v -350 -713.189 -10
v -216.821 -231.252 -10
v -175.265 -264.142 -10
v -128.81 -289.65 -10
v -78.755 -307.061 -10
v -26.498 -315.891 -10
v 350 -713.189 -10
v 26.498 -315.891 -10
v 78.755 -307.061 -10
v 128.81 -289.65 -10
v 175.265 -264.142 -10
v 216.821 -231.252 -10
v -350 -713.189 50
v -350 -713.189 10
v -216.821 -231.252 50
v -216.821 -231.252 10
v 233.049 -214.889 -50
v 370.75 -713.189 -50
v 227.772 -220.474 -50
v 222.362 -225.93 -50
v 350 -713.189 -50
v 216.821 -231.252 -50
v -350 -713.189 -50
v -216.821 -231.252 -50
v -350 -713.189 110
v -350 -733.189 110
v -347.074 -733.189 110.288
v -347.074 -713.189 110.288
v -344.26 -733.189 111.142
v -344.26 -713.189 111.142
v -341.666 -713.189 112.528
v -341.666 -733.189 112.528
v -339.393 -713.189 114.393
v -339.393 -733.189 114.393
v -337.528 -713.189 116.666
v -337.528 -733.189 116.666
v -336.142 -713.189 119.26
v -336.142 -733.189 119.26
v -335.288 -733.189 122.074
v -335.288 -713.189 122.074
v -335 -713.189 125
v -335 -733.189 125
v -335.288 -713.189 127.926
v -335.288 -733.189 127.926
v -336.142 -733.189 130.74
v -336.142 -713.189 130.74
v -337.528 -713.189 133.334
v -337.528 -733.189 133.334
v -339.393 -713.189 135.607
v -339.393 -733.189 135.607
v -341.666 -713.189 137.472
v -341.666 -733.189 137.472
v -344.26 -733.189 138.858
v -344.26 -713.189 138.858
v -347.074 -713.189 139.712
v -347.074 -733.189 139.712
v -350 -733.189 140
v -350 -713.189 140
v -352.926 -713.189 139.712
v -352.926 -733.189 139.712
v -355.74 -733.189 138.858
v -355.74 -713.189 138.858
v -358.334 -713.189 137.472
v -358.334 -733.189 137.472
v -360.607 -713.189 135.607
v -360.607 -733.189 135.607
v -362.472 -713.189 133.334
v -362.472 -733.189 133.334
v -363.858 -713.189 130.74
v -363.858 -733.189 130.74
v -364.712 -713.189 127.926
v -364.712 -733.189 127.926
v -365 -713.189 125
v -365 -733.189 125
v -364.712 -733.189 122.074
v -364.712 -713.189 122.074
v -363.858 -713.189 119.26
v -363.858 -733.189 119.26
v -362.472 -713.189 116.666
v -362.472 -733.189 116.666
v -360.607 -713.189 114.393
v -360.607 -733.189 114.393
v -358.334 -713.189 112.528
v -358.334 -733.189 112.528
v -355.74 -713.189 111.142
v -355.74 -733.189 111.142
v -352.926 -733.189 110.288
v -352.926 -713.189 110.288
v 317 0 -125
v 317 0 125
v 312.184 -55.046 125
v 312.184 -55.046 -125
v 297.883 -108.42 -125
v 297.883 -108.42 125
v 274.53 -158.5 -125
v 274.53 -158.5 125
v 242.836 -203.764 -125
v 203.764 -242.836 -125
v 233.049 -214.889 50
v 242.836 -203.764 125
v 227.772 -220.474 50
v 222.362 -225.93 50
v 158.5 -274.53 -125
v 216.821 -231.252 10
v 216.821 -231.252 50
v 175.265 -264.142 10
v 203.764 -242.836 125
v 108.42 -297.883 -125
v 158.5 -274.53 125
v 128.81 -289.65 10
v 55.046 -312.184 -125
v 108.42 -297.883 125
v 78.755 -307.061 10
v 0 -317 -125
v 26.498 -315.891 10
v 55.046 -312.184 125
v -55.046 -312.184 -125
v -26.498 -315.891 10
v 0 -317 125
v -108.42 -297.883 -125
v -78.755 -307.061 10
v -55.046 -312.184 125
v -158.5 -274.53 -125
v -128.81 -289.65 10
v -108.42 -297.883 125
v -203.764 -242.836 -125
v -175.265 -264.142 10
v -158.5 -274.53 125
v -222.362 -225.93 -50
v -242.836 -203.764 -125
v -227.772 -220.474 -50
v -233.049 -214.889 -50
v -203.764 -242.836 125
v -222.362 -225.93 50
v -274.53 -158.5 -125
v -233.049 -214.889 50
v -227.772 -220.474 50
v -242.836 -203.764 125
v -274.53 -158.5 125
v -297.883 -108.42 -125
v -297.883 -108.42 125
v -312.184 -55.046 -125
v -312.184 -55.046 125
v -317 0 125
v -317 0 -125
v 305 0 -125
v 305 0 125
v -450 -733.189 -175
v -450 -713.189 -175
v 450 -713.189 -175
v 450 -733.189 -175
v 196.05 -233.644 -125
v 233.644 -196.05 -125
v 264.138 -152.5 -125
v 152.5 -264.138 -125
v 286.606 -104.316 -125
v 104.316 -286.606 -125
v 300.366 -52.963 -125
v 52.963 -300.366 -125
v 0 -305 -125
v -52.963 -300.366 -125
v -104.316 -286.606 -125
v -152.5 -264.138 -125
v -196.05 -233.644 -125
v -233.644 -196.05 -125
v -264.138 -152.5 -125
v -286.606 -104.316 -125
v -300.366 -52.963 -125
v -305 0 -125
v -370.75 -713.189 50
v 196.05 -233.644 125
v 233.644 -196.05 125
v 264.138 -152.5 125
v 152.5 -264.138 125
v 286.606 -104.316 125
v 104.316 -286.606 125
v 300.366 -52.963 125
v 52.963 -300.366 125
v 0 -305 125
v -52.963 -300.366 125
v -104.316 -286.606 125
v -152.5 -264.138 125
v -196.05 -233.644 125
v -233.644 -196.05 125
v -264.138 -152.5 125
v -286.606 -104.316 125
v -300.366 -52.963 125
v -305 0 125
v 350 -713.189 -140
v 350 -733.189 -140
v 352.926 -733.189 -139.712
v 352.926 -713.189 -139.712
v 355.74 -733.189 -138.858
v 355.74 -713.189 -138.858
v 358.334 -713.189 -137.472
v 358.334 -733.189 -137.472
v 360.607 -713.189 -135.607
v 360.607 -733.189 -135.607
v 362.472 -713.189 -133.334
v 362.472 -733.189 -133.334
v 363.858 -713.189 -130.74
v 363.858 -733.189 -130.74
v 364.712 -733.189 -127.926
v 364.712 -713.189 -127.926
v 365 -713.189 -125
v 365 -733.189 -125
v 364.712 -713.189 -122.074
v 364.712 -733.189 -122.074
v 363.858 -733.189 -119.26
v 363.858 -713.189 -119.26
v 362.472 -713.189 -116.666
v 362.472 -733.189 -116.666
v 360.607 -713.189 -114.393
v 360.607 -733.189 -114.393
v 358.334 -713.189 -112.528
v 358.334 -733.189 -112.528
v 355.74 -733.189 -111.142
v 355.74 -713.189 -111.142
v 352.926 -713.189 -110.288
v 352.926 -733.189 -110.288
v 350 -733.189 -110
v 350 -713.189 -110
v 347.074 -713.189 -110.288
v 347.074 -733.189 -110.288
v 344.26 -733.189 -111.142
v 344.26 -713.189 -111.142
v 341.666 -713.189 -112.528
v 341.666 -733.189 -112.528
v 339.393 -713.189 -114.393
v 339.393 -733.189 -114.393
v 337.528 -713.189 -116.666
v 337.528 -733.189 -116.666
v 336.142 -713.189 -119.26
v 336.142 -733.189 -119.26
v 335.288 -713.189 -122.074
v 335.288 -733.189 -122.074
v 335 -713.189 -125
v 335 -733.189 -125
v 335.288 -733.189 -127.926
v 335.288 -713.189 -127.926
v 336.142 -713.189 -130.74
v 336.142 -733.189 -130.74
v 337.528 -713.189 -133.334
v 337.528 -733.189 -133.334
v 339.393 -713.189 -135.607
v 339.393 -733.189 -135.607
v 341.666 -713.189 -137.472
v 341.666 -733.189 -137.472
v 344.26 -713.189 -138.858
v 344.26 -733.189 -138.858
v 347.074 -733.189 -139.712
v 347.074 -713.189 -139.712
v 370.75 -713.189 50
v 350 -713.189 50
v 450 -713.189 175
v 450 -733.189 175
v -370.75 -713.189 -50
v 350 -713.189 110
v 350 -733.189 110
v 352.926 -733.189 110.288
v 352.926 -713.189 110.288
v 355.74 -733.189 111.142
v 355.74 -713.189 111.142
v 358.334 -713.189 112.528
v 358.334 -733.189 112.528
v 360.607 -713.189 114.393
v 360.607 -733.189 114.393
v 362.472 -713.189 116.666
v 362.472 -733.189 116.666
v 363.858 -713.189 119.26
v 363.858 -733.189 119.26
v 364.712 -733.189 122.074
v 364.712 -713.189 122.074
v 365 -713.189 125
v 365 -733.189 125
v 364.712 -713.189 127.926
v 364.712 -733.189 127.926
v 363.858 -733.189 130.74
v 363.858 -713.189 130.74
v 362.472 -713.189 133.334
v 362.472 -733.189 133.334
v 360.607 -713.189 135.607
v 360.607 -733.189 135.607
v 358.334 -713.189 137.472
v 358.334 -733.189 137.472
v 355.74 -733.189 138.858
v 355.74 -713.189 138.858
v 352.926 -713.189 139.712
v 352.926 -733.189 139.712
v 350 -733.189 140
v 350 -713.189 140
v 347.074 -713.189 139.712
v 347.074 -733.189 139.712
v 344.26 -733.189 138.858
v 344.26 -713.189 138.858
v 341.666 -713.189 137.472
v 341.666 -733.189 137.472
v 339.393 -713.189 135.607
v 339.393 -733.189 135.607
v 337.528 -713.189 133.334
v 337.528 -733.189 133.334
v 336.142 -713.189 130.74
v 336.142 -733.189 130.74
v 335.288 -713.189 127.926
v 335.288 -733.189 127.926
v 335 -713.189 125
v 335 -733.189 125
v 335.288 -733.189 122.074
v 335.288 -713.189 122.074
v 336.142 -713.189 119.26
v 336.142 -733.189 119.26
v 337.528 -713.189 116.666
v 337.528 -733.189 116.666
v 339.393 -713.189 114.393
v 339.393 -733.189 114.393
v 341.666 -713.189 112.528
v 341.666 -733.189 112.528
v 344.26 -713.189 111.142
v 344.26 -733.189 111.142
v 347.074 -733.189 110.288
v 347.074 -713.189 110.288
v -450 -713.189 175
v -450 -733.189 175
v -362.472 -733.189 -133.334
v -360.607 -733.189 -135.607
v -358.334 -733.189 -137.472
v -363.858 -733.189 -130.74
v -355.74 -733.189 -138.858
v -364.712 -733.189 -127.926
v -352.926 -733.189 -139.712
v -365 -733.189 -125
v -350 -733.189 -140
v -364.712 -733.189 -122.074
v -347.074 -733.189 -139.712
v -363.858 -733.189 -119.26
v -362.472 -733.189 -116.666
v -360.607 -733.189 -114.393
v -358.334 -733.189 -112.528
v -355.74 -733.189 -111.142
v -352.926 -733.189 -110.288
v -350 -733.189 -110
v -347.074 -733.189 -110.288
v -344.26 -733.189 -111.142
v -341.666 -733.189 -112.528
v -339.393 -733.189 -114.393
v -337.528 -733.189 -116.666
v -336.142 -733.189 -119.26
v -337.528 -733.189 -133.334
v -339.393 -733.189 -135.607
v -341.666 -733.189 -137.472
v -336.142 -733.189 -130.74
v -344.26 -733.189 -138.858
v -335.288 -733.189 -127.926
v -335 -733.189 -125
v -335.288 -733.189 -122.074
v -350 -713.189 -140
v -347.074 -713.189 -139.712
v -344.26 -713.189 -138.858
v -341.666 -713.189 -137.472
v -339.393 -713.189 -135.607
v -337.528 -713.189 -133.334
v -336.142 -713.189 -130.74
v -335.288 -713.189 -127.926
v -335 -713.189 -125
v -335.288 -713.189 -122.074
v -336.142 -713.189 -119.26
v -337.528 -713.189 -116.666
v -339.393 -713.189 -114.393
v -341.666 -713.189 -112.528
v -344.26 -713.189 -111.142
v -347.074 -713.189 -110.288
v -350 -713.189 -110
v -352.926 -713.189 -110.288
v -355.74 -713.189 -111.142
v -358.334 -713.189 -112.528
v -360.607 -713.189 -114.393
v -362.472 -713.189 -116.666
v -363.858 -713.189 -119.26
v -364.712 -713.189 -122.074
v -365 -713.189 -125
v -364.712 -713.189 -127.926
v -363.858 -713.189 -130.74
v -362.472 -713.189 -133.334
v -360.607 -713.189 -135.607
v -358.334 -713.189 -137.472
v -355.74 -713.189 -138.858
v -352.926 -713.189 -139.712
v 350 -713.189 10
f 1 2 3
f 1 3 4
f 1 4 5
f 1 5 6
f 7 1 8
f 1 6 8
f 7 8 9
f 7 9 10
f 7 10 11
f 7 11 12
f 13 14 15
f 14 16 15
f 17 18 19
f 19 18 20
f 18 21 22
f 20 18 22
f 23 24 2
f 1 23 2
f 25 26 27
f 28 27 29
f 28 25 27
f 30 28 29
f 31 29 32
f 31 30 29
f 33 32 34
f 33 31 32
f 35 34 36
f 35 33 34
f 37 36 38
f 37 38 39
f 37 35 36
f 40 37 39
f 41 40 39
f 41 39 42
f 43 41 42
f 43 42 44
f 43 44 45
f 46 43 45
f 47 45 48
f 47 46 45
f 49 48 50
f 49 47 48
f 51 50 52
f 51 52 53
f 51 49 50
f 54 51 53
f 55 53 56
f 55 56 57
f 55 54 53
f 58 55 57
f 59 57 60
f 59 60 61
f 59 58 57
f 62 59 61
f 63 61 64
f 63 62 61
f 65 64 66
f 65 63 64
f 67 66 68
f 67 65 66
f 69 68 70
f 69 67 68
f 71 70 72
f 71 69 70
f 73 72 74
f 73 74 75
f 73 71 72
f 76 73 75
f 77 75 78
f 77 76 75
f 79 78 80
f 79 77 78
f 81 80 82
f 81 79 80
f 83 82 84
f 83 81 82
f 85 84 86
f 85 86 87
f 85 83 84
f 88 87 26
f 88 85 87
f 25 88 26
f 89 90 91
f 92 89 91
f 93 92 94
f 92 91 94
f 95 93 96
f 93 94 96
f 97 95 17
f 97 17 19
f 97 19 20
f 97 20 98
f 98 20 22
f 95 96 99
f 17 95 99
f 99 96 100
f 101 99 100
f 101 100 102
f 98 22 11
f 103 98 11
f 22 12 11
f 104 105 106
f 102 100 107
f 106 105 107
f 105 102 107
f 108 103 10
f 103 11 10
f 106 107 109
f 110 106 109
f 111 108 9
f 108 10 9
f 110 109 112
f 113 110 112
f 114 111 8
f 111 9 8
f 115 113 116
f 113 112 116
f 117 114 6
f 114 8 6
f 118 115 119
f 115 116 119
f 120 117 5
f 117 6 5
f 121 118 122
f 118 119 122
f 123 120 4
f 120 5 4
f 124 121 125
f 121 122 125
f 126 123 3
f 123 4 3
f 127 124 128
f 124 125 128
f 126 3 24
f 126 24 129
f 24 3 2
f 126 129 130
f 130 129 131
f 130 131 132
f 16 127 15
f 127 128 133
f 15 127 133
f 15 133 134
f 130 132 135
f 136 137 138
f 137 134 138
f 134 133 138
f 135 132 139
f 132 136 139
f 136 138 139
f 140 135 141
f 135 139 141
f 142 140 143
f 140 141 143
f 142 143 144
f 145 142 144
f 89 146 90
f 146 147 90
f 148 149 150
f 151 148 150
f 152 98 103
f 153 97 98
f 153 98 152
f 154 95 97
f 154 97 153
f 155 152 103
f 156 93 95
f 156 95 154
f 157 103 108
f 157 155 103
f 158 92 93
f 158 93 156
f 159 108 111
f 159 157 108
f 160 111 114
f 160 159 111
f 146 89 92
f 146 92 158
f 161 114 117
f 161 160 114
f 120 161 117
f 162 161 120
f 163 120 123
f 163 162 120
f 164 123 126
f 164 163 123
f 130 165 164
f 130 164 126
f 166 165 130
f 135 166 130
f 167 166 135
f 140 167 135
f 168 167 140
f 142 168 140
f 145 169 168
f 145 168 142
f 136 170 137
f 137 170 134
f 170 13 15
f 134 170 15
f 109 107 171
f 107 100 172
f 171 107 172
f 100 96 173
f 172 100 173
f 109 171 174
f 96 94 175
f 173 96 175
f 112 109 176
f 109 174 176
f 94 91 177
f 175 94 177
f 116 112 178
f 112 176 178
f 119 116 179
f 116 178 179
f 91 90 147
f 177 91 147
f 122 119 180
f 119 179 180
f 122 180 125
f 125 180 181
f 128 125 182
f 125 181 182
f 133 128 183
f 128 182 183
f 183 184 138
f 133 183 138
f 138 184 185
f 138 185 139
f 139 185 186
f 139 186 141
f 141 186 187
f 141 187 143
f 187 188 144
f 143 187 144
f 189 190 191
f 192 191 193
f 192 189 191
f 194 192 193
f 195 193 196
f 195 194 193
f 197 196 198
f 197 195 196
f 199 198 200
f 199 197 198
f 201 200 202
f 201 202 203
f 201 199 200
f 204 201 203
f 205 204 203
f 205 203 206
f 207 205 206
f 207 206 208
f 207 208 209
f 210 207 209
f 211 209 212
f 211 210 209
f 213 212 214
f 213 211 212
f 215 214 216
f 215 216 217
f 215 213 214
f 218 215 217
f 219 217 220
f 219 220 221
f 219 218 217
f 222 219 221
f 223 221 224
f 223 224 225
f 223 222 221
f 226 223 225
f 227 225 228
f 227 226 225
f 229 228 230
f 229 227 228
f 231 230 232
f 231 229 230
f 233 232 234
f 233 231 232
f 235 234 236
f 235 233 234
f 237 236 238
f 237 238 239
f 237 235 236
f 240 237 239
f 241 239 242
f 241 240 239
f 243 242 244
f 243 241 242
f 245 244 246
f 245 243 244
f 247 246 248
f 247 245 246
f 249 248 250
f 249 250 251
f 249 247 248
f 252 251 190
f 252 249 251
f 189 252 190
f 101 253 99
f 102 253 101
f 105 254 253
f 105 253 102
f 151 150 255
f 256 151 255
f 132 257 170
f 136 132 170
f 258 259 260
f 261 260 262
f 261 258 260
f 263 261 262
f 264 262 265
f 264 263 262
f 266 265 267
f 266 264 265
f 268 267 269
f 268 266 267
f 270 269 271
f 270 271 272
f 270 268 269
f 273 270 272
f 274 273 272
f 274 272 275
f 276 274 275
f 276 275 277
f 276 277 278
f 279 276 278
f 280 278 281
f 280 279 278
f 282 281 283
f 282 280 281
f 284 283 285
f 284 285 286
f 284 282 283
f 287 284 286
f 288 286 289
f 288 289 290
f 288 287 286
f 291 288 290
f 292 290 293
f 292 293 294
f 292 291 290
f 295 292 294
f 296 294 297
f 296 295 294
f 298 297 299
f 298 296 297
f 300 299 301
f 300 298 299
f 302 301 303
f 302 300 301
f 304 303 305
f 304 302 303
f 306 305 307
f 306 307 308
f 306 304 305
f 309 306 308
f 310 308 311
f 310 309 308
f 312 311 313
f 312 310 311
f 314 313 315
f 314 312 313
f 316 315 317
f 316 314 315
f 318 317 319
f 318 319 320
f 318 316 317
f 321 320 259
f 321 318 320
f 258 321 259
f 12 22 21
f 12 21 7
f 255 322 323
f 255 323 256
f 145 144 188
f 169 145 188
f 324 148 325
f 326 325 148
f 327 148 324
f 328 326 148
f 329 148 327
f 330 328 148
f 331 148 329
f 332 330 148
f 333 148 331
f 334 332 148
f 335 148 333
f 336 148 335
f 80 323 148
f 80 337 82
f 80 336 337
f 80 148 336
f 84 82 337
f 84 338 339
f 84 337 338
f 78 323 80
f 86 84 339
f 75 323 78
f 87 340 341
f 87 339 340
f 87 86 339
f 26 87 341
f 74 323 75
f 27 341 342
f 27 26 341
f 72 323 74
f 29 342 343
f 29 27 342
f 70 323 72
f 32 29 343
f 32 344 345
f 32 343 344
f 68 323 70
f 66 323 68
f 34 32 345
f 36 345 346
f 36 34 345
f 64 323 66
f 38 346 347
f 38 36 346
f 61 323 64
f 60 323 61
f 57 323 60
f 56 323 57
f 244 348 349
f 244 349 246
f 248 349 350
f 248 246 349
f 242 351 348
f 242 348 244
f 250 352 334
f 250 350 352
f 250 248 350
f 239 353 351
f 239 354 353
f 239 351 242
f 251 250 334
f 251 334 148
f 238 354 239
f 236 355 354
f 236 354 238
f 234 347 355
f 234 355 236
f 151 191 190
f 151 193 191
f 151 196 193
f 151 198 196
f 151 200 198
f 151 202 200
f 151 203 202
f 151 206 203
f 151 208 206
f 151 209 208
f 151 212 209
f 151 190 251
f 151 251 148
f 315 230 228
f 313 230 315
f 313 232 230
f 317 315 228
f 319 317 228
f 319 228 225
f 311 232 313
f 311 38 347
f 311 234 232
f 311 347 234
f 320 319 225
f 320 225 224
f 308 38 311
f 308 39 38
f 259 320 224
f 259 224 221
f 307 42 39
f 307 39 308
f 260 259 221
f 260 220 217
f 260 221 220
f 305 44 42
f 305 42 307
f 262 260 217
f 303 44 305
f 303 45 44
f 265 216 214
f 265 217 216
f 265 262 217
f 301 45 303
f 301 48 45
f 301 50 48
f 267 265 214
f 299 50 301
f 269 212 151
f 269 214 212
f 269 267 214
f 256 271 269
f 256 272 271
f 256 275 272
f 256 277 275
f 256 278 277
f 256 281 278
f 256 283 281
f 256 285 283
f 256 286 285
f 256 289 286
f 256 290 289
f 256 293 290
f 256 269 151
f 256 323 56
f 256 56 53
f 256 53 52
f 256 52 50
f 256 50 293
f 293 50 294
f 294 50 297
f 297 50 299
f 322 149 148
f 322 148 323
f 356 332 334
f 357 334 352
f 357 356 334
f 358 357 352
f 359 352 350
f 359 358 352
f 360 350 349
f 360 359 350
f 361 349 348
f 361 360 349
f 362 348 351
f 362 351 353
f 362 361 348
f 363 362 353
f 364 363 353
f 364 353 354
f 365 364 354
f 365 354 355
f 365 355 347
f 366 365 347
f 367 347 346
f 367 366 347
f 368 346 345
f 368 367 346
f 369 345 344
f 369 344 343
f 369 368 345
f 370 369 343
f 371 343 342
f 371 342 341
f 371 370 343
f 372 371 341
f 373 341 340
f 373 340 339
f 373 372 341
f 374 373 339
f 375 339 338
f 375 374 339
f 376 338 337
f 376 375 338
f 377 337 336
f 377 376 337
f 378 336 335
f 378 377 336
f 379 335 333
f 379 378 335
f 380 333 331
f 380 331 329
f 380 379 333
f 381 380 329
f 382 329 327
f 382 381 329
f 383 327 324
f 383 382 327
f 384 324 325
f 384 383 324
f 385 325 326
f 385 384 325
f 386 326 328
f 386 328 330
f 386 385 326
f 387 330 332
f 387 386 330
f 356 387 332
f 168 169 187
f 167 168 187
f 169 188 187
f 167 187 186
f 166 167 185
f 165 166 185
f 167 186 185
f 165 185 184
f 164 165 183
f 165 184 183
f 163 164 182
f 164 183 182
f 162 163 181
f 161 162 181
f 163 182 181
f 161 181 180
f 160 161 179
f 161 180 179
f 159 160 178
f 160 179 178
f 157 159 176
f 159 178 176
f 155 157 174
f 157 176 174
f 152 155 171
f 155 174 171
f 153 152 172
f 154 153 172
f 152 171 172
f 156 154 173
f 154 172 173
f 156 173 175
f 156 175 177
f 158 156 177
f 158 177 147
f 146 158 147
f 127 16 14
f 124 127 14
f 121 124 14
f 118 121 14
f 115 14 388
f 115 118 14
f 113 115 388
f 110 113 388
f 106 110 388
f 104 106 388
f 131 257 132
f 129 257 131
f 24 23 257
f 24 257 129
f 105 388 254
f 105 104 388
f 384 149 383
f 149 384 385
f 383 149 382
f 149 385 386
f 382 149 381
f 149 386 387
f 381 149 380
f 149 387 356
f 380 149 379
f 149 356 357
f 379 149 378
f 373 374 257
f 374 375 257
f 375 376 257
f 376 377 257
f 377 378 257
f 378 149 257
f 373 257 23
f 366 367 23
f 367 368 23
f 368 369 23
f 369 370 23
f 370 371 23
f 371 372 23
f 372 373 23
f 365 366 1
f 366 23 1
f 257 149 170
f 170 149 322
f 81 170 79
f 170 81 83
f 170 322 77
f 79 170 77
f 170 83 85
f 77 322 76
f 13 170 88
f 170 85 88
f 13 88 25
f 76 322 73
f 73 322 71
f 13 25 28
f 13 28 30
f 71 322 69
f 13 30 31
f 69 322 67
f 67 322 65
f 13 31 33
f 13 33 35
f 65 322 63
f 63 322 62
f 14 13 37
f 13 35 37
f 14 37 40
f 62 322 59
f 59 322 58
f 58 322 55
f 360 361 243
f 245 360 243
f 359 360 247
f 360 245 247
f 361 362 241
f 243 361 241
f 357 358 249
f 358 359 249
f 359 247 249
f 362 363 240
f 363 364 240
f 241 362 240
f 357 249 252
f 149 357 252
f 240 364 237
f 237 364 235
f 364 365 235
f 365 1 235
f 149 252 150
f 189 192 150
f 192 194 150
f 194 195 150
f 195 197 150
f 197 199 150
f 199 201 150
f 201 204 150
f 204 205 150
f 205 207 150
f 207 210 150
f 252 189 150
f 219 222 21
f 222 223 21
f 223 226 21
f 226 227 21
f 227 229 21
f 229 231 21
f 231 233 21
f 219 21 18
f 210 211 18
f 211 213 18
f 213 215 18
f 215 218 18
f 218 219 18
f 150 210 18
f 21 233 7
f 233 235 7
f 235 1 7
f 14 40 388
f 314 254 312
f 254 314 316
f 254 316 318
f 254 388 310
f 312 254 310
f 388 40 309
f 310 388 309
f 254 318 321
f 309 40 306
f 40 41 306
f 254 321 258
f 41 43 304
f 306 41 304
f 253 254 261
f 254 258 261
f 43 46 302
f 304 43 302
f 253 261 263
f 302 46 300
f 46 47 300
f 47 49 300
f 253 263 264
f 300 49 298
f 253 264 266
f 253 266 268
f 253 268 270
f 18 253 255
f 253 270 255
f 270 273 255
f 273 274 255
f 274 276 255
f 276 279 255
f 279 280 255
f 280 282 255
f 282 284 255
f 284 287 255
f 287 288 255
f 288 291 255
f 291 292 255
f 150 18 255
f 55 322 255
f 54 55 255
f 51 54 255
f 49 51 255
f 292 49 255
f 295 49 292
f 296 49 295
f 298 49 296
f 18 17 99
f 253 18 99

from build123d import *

# Parameters (mm, degrees)
BOSS_EXTRUDE1_DEPTH = 125
BOSS_EXTRUDE2_DEPTH = 10
SKETCH3_W           = 900
SKETCH3_H           = 350
SKETCH3_R           = 15
BOSS_EXTRUDE3_DEPTH = 20
SKETCH5_W           = 100
SKETCH5_H           = 540
BOSS_EXTRUDE4_DEPTH = 20
CUT_EXTRUDE1_START  = -676
CUT_EXTRUDE1_DEPTH  = 676


with BuildPart() as part:
    # Sketch1 → Boss-Extrude1 (new, symmetric)
    with BuildSketch(Plane.XY):
        with BuildLine():
            Line((-317, 0), (-305, 0))
            ThreePointArc((-305, 0), (0, -305), (305, 0))
            Line((305, 0), (317, 0))
            ThreePointArc((317, 0), (0, -317), (-317, 0))
        make_face()
    extrude(amount=BOSS_EXTRUDE1_DEPTH, both=True)

    # Sketch2 → Boss-Extrude2 (add, symmetric)
    with BuildSketch(Plane.XY):
        with BuildLine():
            Line((-216.821053663, -231.252309585), (-350, -713.189409477))
            Line((-350, -713.189409477), (350, -713.189409477))
            Line((350, -713.189409477), (216.821053663, -231.252309585))
            ThreePointArc((216.821053663, -231.252309585), (0, -317), (-216.821053663, -231.252309585))
        make_face()
    extrude(amount=BOSS_EXTRUDE2_DEPTH, both=True)

    # Sketch3 → Boss-Extrude3 (add)
    with BuildSketch(Plane.XZ.offset(713.189409477)):
        Rectangle(SKETCH3_W, SKETCH3_H)
        with Locations(Location((-350, 125, 0), (0, 0, 270))):
            Circle(SKETCH3_R, mode=Mode.SUBTRACT)
        with Locations(Location((350, 125, 0), (0, 0, 270))):
            Circle(SKETCH3_R, mode=Mode.SUBTRACT)
        with Locations(Location((-350, -125, 0), (0, 0, 270))):
            Circle(SKETCH3_R, mode=Mode.SUBTRACT)
        with Locations(Location((350, -125, 0), (0, 0, 270))):
            Circle(SKETCH3_R, mode=Mode.SUBTRACT)
    extrude(amount=BOSS_EXTRUDE3_DEPTH)

    # Sketch5 → Boss-Extrude4 (add)
    with BuildSketch(Plane(origin=(-142.067675448, 39.259113542, 0), x_dir=(0, 0, 1), z_dir=(-0.9638741997846356, 0.266357892673614, 0))):
        with Locations((0, -530.650133791)):
            Rectangle(SKETCH5_W, SKETCH5_H)
    boss_extrude4 = extrude(amount=BOSS_EXTRUDE4_DEPTH)

    # Mirror1: Boss-Extrude4 across plane
    add(boss_extrude4.mirror(Plane(origin=(0, 0, 0), x_dir=(0, 0, 1), z_dir=(1, 0, 0))))

    # Sketch6 → Cut-Extrude1 (cut)
    with BuildSketch(Plane(origin=(0, 0, -125), x_dir=(-1, 0, 0), z_dir=(0, 0, -1)).offset(CUT_EXTRUDE1_START)):
        with BuildLine():
            Line((-305, 0), (305, 0))
            ThreePointArc((305, 0), (0, -305), (-305, 0))
        make_face()
    extrude(amount=CUT_EXTRUDE1_DEPTH, mode=Mode.SUBTRACT)


solid = part.part
